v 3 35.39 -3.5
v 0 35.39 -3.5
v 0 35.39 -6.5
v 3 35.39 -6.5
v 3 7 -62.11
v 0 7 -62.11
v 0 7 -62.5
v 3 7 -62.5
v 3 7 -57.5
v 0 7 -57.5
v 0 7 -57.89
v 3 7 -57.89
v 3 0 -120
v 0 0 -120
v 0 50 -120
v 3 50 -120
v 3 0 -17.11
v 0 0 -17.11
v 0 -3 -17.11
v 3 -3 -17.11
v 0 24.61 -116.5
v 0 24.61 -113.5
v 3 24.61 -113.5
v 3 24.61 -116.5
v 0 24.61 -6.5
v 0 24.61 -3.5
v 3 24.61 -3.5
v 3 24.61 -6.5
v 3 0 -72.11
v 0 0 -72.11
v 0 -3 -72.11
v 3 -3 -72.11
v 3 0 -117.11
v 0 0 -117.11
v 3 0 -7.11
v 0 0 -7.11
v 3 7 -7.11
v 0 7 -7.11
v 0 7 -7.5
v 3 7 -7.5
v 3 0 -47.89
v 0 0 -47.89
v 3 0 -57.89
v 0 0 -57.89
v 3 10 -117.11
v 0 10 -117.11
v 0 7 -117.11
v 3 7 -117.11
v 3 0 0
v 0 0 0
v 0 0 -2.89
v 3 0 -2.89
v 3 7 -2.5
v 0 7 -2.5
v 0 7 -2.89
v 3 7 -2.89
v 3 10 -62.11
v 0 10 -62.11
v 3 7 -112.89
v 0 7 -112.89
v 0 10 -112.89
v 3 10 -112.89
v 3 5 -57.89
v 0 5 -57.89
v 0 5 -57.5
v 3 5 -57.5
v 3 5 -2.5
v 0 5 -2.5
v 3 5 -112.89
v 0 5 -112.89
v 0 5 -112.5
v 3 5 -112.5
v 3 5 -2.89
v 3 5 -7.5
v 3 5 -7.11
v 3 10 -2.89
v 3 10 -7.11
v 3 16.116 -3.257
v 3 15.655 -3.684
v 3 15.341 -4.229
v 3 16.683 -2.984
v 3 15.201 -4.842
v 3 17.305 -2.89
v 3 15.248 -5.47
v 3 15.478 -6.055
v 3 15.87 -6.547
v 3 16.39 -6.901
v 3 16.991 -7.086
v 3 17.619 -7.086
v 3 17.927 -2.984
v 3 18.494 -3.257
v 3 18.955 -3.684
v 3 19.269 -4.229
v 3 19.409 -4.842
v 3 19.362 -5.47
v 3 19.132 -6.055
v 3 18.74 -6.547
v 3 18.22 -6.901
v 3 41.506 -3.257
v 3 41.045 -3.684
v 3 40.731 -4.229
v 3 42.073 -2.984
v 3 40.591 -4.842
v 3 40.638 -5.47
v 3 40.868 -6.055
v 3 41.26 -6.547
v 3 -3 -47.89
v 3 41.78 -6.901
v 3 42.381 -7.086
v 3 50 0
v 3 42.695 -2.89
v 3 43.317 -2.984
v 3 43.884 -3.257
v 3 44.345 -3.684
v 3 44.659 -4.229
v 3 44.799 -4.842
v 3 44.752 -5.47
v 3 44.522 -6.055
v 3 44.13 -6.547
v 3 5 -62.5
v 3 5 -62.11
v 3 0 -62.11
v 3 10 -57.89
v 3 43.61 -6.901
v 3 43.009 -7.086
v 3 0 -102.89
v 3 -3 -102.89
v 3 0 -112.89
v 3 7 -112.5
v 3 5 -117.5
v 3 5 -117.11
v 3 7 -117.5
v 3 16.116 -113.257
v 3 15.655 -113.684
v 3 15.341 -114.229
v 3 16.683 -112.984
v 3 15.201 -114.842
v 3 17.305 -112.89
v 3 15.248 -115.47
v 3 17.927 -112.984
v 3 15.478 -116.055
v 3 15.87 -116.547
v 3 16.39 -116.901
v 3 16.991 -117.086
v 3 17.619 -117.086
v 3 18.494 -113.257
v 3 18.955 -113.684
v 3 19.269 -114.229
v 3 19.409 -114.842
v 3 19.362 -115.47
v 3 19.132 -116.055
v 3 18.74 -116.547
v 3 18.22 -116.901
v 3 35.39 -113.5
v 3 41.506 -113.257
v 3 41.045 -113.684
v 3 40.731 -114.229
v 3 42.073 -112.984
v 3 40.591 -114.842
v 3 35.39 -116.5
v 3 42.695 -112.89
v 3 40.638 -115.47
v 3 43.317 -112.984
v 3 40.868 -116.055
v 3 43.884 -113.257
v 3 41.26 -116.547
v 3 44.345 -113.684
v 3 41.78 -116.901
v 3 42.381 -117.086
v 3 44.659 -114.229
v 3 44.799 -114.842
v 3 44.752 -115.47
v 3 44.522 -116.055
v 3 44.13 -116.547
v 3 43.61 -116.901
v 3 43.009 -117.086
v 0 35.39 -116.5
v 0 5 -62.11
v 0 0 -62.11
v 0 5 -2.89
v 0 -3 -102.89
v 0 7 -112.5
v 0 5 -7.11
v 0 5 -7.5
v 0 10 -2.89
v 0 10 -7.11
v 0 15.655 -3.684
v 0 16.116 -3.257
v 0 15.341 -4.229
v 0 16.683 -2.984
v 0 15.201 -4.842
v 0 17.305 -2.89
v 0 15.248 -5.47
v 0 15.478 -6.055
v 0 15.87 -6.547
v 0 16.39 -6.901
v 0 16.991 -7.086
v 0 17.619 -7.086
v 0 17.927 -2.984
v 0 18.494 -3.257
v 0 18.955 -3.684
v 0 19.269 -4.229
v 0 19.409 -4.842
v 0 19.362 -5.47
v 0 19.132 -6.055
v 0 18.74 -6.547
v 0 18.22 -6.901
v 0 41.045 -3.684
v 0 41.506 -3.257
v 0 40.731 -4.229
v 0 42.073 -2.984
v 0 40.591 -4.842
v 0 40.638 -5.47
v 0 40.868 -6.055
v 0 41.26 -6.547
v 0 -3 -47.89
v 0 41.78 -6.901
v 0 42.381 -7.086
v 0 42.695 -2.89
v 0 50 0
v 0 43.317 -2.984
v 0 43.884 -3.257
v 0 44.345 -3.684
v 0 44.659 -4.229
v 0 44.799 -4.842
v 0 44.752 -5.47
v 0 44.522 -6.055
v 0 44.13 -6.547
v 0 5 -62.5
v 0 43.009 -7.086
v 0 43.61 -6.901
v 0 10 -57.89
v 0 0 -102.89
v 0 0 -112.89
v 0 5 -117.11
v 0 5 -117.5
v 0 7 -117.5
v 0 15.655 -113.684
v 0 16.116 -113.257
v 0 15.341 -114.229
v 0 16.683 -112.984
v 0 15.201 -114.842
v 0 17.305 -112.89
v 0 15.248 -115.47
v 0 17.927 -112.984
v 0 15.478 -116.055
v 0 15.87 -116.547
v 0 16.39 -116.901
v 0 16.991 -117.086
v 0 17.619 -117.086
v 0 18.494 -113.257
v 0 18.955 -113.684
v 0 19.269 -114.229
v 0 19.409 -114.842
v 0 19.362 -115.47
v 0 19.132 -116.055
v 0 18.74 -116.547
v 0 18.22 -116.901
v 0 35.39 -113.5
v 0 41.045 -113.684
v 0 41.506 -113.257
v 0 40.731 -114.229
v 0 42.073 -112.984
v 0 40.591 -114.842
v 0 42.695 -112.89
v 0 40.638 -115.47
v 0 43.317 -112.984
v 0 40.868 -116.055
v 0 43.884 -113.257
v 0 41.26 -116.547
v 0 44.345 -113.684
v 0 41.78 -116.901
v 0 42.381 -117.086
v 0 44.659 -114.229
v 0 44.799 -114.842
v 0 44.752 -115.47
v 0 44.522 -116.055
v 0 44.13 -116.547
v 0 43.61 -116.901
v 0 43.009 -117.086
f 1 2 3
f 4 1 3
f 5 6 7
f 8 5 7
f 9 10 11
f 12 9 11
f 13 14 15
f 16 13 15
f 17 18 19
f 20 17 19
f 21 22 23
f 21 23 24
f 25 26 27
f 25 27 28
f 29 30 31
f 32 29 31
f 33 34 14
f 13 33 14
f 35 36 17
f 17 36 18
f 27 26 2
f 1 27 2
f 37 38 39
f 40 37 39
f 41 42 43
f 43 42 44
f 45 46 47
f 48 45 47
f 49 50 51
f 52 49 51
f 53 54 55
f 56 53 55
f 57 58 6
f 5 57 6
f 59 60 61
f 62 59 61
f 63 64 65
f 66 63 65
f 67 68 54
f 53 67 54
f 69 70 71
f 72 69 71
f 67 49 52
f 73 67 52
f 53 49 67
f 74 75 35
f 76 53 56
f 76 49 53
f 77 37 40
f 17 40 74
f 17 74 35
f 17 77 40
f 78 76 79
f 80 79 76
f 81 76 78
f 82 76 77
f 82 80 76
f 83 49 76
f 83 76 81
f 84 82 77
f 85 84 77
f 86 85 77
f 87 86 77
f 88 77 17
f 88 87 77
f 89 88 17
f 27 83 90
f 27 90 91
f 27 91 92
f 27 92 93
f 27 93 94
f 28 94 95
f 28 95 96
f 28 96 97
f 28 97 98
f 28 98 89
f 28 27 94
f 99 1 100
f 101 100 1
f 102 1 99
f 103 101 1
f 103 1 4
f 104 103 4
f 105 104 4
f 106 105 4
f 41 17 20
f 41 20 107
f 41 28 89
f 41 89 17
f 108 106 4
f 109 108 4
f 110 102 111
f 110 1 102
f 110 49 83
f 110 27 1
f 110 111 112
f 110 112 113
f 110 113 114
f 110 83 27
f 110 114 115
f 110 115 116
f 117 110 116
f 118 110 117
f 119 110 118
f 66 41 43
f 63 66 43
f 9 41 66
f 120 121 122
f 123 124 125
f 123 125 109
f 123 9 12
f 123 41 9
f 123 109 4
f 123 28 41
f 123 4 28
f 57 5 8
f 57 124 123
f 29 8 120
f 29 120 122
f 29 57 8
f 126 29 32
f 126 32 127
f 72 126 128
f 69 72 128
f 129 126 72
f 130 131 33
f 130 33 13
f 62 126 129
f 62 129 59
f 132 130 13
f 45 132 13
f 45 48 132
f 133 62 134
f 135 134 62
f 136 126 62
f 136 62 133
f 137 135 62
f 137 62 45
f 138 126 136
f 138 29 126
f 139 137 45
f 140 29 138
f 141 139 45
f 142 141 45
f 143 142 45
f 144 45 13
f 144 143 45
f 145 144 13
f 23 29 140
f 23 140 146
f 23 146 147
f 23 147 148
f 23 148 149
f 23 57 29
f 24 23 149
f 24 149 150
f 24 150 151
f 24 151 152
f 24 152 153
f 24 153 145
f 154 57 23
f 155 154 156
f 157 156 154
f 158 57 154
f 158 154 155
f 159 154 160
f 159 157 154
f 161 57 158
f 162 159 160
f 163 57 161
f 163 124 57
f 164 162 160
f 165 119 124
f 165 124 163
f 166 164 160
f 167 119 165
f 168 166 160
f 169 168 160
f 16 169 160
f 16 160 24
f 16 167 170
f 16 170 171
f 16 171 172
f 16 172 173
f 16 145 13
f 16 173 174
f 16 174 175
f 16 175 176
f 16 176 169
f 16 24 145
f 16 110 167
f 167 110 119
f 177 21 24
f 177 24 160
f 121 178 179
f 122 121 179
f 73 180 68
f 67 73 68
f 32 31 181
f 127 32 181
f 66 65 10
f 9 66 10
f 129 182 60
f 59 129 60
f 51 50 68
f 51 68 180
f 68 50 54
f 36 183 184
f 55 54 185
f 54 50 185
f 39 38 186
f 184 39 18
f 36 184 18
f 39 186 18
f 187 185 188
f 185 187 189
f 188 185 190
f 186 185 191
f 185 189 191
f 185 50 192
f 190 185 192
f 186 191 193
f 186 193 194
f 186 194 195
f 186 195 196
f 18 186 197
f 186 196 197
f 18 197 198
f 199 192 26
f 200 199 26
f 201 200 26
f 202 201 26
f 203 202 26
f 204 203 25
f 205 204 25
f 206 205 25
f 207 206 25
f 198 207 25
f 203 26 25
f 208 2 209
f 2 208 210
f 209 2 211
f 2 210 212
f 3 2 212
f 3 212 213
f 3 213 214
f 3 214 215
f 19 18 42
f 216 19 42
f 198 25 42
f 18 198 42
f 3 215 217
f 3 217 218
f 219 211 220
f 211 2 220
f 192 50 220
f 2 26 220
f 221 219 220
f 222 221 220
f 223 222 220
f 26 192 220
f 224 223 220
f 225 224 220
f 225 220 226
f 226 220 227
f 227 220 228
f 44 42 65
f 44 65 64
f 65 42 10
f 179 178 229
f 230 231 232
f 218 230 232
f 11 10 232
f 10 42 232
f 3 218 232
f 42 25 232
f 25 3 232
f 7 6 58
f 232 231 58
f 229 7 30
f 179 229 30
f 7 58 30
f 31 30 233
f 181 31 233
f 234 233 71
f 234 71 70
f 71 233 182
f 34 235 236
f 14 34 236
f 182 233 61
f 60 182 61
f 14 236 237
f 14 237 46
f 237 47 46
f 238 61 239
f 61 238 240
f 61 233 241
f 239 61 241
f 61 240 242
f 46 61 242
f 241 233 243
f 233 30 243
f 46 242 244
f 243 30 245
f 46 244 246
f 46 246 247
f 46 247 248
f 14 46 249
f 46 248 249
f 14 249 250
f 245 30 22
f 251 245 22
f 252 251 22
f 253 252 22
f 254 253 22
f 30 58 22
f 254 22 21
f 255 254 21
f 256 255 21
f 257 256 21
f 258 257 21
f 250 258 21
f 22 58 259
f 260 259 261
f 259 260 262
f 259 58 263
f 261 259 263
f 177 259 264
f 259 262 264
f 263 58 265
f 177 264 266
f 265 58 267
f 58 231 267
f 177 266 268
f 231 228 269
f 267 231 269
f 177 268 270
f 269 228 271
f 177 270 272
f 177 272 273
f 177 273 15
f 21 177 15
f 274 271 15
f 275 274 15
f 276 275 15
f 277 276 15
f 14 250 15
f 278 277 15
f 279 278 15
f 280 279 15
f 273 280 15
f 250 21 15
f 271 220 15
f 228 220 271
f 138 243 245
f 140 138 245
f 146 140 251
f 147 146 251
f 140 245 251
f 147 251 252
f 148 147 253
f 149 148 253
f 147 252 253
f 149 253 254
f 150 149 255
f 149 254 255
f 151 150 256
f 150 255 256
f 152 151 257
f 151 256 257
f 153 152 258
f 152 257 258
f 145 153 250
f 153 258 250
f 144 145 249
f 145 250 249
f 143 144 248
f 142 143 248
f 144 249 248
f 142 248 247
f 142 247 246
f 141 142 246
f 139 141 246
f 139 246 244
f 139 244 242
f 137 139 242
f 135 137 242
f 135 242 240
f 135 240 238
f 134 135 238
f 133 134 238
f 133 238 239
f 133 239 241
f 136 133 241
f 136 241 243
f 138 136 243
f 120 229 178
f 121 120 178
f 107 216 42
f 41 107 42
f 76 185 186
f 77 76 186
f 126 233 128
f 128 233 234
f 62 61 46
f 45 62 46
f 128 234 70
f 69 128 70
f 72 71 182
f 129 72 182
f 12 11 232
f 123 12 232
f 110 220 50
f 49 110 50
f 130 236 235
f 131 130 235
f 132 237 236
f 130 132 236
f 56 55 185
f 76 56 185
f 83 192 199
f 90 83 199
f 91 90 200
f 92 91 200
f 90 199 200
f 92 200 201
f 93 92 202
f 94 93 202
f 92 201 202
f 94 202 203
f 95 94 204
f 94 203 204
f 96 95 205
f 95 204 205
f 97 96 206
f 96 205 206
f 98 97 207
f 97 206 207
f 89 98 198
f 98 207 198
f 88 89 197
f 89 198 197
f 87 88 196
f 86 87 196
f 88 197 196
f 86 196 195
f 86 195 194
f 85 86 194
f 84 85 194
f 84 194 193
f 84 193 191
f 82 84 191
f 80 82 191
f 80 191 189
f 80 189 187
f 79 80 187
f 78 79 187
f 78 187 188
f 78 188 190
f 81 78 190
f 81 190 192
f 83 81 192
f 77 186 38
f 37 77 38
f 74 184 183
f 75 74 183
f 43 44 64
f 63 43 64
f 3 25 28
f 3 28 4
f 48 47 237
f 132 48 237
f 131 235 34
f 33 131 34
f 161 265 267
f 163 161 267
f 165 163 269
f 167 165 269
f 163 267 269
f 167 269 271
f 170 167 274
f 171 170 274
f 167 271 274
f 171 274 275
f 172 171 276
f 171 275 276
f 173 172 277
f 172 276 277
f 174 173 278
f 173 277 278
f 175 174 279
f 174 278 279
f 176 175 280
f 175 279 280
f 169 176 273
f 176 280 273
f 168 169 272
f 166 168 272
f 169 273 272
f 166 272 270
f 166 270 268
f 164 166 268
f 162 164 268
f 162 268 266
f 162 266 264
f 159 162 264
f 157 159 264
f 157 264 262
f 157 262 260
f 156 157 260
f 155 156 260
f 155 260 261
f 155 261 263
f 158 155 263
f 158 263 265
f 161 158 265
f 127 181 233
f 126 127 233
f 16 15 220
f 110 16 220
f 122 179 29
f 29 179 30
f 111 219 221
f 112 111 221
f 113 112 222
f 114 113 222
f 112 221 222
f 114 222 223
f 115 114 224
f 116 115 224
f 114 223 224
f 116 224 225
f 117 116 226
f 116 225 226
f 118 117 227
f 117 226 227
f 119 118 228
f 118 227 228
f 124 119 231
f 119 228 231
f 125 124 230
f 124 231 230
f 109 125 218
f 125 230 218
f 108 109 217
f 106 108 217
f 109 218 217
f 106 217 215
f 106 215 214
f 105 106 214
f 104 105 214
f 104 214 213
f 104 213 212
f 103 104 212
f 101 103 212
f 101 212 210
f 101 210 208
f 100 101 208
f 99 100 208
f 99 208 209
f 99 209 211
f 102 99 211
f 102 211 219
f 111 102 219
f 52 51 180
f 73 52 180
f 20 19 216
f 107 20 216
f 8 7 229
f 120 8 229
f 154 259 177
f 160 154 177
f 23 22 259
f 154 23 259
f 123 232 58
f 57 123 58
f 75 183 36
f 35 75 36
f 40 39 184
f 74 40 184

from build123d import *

# Parameters (mm, degrees)
SKETCH2_W                      = 3
SKETCH2_H                      = 10.78
BOSS_EXTRUDE2_DEPTH            = 3
HOLE_FOR_M3_300_SC_NUTS_SP_1_D = 4.22


with BuildPart() as part:
    # Sketch2 → Boss-Extrude2 (new body)
    with BuildSketch(Plane(origin=(0, 0, 0), x_dir=(0, 0, -1), z_dir=(1, 0, 0))):
        Polygon((0, 0), (2.89, 0), (2.89, 5), (2.5, 5), (2.5, 7), (2.89, 7), (2.89, 10), (7.11, 10), (7.11, 7), (7.5, 7), (7.5, 5), (7.11, 5), (7.11, 0), (17.11, 0), (17.11, -3), (47.89, -3), (47.89, 0), (57.89, 0), (57.89, 5), (57.5, 5), (57.5, 7), (57.89, 7), (57.89, 10), (62.11, 10), (62.11, 7), (62.5, 7), (62.5, 5), (62.11, 5), (62.11, 0), (72.11, 0), (72.11, -3), (102.89, -3), (102.89, 0), (112.89, 0), (112.89, 5), (112.5, 5), (112.5, 7), (112.89, 7), (112.89, 10), (117.11, 10), (117.11, 7), (117.5, 7), (117.5, 5), (117.11, 5), (117.11, 0), (120, 0), (120, 50), (0, 50), align=None)
        with Locations((115, 30)):
            Rectangle(SKETCH2_W, SKETCH2_H, mode=Mode.SUBTRACT)
        with Locations((5, 30)):
            Rectangle(SKETCH2_W, SKETCH2_H, mode=Mode.SUBTRACT)
    extrude(amount=BOSS_EXTRUDE2_DEPTH)

    # Hole for M3 300® SC Nuts (SP)1 (through all)
    with Locations(Plane(origin=(3, 0, 0), x_dir=(0, 0, -1), z_dir=(1, 0, 0))):
        with Locations((5, 42.695), (5, 17.305), (115, 42.695), (115, 17.305)):
            Hole(HOLE_FOR_M3_300_SC_NUTS_SP_1_D / 2)


solid = part.part
